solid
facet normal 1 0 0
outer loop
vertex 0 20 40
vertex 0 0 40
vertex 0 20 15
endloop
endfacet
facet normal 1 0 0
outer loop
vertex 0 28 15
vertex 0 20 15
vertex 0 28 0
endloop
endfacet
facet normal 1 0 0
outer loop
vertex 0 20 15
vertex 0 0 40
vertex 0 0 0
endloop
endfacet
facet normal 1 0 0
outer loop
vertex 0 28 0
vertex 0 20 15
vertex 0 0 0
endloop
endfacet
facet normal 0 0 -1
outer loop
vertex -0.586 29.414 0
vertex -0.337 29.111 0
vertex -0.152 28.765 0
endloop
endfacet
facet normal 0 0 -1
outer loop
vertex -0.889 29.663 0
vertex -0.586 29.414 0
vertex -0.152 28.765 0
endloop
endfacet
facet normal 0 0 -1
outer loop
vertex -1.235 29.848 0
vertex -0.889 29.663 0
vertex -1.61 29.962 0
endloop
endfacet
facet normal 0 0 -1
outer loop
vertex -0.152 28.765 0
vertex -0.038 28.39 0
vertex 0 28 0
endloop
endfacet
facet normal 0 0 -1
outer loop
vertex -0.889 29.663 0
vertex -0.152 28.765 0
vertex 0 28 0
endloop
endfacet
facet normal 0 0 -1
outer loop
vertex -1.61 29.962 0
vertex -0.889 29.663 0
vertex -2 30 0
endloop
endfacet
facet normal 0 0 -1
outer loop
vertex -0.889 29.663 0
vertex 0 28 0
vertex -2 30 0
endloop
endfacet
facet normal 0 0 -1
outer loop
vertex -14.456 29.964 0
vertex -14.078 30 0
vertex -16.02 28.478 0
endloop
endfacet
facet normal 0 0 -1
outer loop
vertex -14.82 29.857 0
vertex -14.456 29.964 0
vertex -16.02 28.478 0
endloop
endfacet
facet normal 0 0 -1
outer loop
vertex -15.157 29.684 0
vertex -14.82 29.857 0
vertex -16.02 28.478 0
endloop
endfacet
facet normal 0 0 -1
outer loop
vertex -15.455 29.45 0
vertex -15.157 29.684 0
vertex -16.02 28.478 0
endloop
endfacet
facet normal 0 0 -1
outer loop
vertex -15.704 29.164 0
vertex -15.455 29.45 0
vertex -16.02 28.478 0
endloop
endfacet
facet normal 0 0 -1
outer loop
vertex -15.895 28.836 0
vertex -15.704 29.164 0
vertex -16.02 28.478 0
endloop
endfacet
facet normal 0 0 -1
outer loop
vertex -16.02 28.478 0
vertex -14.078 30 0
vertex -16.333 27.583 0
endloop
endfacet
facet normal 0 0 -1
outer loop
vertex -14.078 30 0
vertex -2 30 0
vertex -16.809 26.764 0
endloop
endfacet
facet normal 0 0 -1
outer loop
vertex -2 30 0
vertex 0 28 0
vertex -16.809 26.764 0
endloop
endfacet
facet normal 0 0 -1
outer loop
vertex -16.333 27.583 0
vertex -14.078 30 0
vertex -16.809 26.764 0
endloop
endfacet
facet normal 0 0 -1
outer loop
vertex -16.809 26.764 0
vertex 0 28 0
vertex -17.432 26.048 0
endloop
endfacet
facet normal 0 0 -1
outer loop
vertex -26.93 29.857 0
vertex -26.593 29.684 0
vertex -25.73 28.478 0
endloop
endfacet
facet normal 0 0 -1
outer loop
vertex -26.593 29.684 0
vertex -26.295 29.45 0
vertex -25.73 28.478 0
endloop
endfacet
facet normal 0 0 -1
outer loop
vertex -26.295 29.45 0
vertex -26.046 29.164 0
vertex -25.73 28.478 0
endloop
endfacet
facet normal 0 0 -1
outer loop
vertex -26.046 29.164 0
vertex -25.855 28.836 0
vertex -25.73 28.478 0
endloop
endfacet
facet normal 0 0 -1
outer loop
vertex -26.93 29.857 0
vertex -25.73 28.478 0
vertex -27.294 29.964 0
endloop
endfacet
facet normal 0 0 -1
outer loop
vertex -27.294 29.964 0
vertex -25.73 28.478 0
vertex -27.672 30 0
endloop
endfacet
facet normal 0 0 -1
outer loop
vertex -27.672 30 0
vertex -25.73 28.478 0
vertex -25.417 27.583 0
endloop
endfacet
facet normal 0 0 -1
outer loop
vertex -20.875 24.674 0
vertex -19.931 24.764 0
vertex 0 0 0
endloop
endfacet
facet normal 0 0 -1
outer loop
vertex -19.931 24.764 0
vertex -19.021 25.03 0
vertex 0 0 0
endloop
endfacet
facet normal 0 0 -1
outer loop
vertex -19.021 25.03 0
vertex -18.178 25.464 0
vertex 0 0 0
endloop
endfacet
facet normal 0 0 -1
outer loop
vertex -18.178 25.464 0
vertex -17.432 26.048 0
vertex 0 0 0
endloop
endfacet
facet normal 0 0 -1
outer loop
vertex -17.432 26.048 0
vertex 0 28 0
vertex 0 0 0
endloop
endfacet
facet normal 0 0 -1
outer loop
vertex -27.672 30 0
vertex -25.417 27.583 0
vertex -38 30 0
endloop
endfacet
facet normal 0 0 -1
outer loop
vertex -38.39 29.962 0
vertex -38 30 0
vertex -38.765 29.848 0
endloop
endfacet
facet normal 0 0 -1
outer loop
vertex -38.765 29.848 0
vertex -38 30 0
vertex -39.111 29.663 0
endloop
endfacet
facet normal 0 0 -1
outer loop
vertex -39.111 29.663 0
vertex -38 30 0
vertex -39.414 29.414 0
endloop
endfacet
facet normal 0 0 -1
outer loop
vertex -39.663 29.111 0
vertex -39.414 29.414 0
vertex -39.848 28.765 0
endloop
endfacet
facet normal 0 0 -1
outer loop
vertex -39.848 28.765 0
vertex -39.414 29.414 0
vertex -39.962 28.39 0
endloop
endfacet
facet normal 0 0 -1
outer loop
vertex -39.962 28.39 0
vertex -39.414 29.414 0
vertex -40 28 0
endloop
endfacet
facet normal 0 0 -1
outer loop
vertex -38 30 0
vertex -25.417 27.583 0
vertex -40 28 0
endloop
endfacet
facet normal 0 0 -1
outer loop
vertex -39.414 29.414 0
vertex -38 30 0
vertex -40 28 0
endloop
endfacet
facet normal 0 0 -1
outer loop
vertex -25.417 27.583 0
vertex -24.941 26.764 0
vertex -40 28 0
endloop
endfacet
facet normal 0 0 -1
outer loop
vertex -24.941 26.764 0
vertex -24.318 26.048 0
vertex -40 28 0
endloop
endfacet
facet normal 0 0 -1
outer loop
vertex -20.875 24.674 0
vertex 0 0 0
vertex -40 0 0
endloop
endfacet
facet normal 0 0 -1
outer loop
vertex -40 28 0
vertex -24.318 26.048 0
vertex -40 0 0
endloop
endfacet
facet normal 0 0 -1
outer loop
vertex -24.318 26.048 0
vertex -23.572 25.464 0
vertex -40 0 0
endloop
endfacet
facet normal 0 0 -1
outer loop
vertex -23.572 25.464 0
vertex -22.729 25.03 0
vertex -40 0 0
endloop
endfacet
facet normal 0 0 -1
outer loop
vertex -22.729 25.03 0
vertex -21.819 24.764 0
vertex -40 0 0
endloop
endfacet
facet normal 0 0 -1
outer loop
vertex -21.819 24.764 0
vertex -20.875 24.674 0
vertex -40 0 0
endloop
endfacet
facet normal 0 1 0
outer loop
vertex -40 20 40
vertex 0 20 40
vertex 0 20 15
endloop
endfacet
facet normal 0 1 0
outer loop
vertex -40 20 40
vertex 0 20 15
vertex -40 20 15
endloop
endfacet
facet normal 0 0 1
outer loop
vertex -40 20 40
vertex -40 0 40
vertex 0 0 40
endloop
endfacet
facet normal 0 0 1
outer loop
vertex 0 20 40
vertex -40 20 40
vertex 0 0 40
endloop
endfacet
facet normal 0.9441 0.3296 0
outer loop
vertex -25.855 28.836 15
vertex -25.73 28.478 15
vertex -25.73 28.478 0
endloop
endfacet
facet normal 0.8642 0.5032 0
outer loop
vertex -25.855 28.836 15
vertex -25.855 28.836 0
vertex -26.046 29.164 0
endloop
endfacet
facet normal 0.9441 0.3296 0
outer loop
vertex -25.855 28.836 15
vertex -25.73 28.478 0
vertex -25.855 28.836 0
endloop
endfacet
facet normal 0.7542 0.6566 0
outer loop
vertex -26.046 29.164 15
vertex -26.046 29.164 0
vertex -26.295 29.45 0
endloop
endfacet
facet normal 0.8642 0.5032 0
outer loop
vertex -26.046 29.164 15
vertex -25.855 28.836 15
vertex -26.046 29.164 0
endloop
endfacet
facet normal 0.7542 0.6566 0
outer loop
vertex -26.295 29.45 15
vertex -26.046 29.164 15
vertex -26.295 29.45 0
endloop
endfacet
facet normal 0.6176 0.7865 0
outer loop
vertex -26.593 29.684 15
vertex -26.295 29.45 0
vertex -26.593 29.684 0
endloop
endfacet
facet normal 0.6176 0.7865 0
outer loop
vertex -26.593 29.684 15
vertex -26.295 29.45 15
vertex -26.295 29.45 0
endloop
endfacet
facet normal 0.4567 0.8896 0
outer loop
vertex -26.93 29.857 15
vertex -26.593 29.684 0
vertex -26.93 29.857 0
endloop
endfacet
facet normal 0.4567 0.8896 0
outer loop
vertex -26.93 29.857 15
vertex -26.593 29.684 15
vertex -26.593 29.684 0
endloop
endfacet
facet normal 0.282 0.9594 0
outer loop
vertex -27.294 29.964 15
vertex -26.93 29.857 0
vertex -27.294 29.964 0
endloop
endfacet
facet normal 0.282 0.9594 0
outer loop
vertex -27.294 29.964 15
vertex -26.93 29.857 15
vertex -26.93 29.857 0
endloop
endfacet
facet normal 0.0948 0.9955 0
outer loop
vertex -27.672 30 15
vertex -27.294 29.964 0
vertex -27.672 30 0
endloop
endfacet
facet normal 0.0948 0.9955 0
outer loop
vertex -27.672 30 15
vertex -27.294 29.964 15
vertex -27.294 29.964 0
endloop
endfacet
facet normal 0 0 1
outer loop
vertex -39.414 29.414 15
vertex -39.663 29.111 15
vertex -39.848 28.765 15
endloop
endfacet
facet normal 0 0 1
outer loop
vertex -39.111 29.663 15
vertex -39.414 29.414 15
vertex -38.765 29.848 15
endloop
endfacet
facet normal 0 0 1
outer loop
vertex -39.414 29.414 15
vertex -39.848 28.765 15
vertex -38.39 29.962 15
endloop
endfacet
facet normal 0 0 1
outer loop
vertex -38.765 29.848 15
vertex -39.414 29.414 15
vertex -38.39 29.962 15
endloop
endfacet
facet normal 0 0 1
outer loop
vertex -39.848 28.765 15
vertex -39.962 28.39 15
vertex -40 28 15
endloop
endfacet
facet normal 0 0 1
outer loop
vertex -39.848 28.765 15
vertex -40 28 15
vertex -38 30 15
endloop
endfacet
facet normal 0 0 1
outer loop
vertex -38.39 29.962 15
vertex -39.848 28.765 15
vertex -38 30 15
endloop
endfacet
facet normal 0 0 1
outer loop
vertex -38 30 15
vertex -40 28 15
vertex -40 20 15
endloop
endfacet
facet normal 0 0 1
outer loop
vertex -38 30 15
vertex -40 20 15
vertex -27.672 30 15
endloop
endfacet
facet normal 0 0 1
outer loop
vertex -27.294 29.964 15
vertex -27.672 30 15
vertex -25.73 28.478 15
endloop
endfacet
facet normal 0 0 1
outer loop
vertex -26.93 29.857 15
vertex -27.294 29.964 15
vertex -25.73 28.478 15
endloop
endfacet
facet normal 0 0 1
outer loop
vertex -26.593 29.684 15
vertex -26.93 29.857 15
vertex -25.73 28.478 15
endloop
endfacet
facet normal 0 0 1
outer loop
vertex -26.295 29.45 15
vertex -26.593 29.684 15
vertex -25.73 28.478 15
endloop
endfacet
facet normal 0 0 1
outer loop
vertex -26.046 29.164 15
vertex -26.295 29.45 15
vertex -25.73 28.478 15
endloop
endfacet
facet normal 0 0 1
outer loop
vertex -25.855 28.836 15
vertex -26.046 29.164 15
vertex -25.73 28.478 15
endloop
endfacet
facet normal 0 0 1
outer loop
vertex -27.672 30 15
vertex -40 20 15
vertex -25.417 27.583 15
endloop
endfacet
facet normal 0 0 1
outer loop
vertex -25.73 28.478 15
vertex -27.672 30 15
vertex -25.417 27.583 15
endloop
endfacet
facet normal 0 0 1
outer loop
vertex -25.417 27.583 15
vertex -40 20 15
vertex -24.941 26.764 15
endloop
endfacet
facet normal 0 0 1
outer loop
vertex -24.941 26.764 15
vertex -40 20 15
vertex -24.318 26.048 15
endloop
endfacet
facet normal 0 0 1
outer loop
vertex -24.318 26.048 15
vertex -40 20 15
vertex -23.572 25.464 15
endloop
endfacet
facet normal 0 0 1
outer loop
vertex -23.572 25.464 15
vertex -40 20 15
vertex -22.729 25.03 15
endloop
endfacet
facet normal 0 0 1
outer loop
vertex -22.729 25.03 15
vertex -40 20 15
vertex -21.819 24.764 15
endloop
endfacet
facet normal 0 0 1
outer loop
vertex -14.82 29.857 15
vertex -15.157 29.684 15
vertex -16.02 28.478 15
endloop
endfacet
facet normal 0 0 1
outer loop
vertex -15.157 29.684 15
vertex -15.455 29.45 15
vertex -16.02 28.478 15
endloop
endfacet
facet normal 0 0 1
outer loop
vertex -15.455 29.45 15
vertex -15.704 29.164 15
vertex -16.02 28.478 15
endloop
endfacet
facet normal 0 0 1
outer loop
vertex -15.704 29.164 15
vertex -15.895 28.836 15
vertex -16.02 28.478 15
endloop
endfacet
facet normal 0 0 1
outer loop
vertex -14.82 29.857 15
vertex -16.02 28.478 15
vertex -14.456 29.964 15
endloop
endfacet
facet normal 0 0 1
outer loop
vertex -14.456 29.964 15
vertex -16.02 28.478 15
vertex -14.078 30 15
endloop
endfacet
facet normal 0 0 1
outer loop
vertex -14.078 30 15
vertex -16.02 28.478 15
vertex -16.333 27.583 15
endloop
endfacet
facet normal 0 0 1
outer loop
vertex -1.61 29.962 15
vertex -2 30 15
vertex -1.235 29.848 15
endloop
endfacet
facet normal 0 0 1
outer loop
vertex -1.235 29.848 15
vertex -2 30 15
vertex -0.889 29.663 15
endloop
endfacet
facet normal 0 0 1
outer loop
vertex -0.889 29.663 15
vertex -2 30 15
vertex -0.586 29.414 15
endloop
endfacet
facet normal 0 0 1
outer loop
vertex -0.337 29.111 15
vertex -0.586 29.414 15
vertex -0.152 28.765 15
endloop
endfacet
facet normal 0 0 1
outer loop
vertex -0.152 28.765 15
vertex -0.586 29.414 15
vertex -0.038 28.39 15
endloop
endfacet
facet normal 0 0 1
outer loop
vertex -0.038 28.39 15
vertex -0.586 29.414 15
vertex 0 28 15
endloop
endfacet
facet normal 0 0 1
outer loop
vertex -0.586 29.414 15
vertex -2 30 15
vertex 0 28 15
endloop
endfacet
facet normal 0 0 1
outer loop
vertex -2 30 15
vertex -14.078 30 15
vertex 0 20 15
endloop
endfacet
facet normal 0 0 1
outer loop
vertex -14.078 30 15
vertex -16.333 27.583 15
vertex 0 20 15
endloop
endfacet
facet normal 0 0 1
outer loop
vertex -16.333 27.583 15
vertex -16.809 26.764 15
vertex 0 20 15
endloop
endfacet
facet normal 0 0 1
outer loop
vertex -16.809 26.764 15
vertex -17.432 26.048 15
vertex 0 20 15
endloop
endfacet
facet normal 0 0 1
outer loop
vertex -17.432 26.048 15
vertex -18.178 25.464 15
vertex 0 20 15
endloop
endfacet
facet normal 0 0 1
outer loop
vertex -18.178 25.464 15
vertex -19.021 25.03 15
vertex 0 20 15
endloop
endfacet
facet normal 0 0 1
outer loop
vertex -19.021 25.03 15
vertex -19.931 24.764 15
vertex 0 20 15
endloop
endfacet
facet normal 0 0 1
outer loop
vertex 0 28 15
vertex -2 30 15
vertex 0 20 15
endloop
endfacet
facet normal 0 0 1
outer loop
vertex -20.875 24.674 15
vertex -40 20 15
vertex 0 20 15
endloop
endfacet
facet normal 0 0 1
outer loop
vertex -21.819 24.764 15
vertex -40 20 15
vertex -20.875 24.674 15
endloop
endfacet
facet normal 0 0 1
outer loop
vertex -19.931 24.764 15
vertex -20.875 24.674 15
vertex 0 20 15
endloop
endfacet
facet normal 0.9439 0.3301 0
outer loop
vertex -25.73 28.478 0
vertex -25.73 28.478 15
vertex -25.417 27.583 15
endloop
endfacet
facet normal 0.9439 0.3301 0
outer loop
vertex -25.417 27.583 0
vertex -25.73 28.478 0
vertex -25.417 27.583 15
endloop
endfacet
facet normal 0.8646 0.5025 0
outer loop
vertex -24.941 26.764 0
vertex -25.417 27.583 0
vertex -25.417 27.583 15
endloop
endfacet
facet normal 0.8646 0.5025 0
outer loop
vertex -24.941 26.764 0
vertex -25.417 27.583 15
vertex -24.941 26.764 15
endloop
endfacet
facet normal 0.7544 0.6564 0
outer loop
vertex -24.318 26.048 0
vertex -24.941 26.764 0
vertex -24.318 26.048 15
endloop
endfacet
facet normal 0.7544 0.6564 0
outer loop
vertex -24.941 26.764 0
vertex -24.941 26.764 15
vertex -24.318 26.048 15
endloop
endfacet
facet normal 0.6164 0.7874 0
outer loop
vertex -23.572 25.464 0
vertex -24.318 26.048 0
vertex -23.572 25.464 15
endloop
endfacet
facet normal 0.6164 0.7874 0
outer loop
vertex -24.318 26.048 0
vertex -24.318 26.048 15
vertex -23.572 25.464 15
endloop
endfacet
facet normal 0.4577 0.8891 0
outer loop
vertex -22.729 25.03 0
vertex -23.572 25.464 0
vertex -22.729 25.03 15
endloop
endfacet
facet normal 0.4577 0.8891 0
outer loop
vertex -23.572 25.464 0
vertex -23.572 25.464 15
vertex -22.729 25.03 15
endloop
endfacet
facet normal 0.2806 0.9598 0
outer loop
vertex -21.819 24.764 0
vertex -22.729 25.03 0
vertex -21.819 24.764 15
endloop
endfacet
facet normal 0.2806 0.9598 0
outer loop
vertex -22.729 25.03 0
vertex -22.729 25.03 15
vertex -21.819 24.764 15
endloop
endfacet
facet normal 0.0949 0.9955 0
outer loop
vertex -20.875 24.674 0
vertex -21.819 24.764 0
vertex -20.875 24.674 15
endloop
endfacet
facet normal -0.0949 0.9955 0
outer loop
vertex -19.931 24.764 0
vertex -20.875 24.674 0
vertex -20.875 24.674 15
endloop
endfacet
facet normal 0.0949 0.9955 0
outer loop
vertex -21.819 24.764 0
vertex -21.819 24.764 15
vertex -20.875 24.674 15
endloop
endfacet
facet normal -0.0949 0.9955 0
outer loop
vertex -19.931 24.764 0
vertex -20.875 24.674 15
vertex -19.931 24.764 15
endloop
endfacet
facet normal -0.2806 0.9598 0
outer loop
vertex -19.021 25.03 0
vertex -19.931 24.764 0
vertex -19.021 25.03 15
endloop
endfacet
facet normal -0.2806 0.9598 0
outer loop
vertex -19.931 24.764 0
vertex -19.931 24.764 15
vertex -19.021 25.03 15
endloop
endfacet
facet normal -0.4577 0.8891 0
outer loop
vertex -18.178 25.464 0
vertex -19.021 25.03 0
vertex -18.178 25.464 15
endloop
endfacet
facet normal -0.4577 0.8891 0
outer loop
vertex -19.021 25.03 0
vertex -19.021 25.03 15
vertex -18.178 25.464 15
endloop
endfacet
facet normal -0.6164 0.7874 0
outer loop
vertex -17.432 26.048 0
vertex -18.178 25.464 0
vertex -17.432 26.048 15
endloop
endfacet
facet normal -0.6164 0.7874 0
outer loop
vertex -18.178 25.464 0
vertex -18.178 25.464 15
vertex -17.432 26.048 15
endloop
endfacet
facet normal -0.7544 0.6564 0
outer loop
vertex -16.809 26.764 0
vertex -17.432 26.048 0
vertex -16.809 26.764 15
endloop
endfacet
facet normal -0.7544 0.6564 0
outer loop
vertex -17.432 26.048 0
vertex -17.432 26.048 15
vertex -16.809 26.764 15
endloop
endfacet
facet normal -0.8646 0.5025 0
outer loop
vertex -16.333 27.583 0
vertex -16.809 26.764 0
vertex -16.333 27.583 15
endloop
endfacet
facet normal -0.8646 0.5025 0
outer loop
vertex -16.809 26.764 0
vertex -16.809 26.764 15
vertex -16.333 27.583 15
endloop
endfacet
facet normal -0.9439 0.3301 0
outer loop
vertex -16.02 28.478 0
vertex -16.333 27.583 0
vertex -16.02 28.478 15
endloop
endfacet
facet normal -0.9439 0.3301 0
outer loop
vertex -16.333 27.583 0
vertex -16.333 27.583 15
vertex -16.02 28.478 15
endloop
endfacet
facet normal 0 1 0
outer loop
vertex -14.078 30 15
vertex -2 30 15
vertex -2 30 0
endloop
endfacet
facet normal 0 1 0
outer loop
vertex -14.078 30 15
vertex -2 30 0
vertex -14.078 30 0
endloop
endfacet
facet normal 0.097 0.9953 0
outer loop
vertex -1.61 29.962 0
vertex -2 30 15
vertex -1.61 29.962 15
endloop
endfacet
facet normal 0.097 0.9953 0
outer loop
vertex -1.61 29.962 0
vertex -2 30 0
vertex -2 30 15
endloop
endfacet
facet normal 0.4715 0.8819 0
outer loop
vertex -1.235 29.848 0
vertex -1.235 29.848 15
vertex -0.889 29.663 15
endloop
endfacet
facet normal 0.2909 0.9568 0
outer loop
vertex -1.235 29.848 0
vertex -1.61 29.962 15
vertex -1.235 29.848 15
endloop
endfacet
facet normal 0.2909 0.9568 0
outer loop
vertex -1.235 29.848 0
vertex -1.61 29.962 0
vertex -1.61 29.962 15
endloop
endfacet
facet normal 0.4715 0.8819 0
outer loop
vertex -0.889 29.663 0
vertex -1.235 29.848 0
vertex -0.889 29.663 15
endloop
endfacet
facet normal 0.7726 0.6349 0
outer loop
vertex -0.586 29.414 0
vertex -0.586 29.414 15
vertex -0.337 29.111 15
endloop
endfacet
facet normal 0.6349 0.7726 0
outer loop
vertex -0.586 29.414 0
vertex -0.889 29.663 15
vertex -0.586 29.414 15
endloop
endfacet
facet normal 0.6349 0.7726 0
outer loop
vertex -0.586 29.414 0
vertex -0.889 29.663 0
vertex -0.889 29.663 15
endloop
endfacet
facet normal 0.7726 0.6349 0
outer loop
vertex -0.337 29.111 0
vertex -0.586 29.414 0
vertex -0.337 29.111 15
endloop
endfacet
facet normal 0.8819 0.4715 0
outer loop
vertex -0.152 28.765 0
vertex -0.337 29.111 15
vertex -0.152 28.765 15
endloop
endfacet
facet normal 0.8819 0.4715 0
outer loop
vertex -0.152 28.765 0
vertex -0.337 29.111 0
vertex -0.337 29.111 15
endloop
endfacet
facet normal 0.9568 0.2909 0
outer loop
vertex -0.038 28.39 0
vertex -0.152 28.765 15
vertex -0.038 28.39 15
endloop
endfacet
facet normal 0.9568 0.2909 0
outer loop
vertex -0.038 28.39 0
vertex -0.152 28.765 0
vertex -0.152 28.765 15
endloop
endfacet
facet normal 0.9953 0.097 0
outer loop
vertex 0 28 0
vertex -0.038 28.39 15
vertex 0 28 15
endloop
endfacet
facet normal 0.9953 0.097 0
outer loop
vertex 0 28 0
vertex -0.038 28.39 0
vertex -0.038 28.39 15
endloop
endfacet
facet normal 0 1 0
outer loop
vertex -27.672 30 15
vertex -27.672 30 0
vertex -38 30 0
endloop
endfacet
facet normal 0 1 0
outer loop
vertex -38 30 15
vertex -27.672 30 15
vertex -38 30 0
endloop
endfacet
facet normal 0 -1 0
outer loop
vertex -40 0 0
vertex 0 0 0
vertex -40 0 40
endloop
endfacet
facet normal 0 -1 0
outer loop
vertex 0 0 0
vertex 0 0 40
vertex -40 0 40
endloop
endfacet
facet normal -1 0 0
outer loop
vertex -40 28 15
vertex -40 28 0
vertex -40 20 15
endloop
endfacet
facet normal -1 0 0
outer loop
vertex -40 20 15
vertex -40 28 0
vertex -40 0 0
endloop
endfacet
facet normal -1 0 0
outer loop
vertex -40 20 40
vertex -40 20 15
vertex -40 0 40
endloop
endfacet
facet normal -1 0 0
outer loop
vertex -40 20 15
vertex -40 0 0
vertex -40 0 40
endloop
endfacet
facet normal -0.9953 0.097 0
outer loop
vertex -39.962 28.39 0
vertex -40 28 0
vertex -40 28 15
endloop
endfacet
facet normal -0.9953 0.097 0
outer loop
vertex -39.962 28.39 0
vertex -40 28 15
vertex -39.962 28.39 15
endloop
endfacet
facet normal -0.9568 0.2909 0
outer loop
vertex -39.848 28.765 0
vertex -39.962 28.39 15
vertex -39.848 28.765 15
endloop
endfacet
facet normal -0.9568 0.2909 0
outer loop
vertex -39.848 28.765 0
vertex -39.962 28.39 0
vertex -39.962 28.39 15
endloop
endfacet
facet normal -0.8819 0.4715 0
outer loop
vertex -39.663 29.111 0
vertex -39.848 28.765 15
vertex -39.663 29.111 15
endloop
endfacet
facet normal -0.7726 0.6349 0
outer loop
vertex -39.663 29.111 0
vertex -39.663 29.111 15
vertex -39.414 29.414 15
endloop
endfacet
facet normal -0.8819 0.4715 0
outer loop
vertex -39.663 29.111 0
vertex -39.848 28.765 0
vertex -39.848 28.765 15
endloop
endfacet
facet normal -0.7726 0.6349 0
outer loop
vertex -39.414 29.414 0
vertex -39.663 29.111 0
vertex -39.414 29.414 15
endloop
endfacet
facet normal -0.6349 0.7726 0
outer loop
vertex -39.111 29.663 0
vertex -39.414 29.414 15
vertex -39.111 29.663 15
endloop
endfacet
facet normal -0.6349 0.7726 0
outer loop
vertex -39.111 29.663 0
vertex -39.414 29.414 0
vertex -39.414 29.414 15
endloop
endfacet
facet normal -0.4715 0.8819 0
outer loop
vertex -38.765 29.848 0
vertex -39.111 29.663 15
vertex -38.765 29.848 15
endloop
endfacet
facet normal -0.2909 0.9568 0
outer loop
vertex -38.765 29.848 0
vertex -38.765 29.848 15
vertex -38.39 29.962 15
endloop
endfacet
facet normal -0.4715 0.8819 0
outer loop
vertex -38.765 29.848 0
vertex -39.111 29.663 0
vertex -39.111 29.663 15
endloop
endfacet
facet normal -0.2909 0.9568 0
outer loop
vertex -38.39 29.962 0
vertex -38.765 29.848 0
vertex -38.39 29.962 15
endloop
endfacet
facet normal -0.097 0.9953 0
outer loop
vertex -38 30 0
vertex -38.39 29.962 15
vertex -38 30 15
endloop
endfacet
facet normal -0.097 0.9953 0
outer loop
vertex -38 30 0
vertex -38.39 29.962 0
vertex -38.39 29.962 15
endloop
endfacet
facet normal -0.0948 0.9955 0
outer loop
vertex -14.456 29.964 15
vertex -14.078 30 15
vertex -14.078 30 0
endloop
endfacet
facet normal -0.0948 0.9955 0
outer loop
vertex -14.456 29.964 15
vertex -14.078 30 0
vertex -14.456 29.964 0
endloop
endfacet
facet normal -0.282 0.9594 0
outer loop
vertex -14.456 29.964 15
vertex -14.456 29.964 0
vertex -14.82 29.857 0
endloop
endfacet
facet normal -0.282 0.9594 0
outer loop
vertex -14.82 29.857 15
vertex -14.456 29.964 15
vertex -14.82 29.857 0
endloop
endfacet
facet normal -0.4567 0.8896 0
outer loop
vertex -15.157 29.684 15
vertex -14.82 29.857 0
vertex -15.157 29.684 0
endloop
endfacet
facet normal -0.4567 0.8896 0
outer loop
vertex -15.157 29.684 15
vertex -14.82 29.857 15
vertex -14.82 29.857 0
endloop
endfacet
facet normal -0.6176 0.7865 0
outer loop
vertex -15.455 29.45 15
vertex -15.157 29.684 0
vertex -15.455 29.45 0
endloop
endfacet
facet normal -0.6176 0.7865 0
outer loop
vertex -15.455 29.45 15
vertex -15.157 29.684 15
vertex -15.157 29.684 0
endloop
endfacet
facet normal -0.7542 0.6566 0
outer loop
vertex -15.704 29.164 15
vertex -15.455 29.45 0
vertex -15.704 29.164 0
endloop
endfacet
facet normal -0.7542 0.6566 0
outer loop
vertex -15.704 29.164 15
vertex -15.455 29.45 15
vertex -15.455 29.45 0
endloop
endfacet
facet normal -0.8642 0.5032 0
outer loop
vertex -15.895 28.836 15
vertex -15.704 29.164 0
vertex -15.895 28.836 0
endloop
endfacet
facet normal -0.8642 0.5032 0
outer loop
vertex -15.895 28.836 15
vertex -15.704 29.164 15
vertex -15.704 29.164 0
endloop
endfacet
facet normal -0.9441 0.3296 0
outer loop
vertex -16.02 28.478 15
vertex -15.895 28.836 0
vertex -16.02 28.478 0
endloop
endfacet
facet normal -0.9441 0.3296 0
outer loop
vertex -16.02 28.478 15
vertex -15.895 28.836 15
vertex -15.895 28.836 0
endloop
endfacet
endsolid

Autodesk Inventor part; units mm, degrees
ref_plane "YZ Plane" through (0, 0, 0) normal (1, 0, 0) x (0, 1, 0)
ref_plane "XZ Plane" through (0, 0, 0) normal (0, 1, 0) x (-1, 0, 0)
ref_plane "XY Plane" through (0, 0, 0) normal (0, 0, 1) x (1, 0, 0)
sketch "Sketch1" plane through (0, 0, 0) normal (0, 1, 0) x (-1, 0, 0)
  line L0 (0, 0) -> (40, 0)
  line L1 (40, 0) -> (40, 40)
  line L2 (40, 40) -> (0, 40)
  line L3 (0, 40) -> (0, 0)
  dimension "d0" = 40
  dimension "d1" = 40
extrude "Extrusion1" add sketch "Sketch1" along normal blind 20
sketch "Sketch2" plane through (0, 20, 0) normal (0, 1, 0) x (1, 0, 0)
  line L0 (0, -40) -> (0, 0) projected
  line L1 (-40, 0) -> (-40, -40) projected
  line L2 (0, 0) -> (-40, 0)
  line L3 (-40, 0) -> (-40, -15)
  line L4 (-40, -15) -> (0, -15)
  line L5 (0, -15) -> (0, 0)
  dimension "d4" = 15
extrude "Extrusion2" add sketch "Sketch2" along normal blind 20
sketch "Sketch3" plane through (-40, 20, 15) normal (0, 0, 1) x (1, 0, 0)
  circle A0 centre (19.125, 9.6739) radius 5
  point P0 (40, -20)
  dimension "d7" = 10
extrude "Extrusion3" cut sketch "Sketch3" against normal blind 20
sketch "Sketch4" plane through (-40, 20, 15) normal (0, 0, 1) x (1, 0, 0)
  line L0 (40, 20) -> (0, 20) projected
  line L1 (40, -20) -> (40, 20) projected
  line L2 (0, 20) -> (40, 20)
  line L3 (40, 20) -> (40, 10)
  line L4 (40, 10) -> (0, 10)
  line L5 (0, 10) -> (0, 20)
  dimension "d10" = 10
extrude "Extrusion4" cut sketch "Sketch4" against normal blind 20
fillet "Fillet1" radius 2 4 edges at (-40, 30, 7.5) (-25.8644, 30, 7.5) (-15.8857, 30, 7.5) (0, 30, 7.5)
sketch "Sketch5" plane through (0, 20, 0) normal (0, 1, 0) x (1, 0, 0)
  line L0 (-4.8773, 1.27) -> (4.8773, 1.27) construction
  line L1 (4.8773, 1.27) -> (4.8773, -1.27) construction
  line L2 (4.8773, -1.27) -> (-4.8773, -1.27) construction
  line L3 (-4.8773, -1.27) -> (-4.8773, 1.27) construction
  point P0 (0, 0)
equation "\"BendRadius\" = Thickness"
equation "\"BendReliefWidth\" = Thickness"
equation "\"BendReliefDepth\" = 0.5 * Thickness"
equation "\"CornerReliefSize\" = 4 * Thickness"
equation "\"MinimumRemnant\" = 2 * Thickness"
equation "\"TransitionRadius\" = BendRadius"
equation "\"JacobiRadiusSize\" = BendRadius"
equation "\"GapSize\" = Thickness"
equation "\"Thickness\" = 3.048"
properties part number "DIODA"
